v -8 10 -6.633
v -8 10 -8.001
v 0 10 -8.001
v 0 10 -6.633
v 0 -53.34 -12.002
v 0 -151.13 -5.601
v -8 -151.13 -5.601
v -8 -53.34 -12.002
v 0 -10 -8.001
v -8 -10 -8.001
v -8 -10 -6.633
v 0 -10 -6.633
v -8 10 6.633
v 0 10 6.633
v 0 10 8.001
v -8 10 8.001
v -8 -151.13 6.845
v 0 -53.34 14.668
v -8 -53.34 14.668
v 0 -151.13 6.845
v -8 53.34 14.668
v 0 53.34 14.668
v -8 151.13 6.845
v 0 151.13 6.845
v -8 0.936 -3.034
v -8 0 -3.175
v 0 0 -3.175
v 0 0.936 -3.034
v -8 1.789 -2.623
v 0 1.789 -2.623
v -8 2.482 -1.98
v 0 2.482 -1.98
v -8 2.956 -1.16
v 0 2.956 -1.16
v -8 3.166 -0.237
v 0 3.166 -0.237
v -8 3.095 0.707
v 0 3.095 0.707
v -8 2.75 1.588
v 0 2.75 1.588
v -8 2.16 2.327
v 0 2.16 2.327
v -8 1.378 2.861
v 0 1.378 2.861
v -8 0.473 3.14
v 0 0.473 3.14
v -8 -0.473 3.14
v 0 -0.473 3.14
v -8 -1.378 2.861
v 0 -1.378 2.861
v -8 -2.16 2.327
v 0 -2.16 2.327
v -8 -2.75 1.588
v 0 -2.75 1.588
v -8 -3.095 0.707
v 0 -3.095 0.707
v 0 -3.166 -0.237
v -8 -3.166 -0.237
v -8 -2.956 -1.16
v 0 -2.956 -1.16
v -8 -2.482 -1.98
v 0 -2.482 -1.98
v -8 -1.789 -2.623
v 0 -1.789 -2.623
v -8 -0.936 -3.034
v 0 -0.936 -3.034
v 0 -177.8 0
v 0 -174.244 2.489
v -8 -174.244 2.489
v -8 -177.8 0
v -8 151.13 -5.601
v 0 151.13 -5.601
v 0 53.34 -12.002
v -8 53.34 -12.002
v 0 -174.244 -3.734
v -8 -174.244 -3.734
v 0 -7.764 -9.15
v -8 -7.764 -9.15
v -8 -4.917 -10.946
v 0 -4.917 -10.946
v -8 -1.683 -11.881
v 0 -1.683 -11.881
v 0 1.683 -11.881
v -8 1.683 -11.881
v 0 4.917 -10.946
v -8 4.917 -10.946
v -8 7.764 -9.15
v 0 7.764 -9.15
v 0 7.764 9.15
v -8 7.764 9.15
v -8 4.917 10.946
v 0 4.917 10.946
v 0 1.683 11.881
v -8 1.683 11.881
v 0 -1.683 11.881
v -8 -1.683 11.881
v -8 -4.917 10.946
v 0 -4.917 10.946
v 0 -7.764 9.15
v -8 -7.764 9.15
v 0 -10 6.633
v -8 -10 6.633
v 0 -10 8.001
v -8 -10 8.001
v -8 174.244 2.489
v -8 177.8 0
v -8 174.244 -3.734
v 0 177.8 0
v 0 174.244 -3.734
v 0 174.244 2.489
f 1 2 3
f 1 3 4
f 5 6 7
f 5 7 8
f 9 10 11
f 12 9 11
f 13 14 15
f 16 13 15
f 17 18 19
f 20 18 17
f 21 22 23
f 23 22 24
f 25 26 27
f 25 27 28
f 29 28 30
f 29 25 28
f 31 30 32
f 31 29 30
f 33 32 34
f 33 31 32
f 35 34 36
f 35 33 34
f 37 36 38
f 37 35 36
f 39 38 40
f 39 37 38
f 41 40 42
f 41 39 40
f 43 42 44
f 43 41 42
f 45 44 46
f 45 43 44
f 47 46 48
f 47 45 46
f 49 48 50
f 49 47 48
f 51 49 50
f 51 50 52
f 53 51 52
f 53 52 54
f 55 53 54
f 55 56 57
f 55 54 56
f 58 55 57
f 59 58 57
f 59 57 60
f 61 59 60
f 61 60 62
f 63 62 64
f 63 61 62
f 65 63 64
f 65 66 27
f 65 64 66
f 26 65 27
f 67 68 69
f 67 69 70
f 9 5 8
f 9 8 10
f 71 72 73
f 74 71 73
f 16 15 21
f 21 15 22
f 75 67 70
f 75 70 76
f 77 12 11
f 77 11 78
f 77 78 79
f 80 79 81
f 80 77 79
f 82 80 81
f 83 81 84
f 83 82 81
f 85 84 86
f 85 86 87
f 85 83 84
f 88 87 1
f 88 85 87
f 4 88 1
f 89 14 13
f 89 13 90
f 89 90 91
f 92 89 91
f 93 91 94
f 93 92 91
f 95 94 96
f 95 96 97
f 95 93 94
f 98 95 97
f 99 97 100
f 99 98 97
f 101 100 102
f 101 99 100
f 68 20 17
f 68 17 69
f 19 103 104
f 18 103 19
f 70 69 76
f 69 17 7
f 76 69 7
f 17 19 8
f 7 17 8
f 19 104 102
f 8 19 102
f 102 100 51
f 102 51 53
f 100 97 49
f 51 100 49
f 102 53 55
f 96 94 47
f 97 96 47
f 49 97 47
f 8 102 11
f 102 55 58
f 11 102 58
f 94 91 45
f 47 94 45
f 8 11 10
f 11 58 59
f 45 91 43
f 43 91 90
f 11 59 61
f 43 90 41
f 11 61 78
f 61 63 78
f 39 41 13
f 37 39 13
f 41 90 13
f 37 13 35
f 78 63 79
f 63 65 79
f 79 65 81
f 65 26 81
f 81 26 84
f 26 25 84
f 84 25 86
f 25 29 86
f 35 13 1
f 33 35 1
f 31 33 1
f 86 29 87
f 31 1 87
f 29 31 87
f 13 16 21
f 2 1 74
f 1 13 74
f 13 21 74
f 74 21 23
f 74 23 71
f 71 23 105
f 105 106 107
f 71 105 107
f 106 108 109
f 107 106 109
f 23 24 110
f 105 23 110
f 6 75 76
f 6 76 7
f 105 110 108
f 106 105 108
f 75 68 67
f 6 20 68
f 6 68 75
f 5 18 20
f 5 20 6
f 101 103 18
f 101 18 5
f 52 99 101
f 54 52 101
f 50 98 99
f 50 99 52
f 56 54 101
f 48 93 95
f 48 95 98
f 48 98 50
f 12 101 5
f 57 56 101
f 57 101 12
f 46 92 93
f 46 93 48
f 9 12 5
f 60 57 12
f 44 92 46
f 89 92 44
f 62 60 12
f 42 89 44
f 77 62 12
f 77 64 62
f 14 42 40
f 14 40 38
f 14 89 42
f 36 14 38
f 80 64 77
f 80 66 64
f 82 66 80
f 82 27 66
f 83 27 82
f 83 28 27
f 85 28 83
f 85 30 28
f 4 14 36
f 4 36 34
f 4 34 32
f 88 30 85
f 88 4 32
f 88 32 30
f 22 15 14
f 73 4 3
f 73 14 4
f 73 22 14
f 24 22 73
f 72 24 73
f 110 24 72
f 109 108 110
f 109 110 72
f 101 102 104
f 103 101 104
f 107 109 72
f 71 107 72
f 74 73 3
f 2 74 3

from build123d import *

# Parameters (mm, degrees)
BOSS_EXTRUDE1_DEPTH     = 8
BOSS_EXTRUDE1_2_DEPTH   = 8
SKETCH2_R               = 12
BOSS_EXTRUDE2_DEPTH     = 8
CUT_EXTRUDE1_DEPTH      = 179.583327588
CUT_EXTRUDE1_DEPTH_BACK = 179.583327588
SKETCH3_R               = 3.175


with BuildPart() as part:
    # Sketch1 → Boss-Extrude1 (new body)
    with BuildSketch(Plane(origin=(0, 0, 0), x_dir=(0, 0, -1), z_dir=(1, 0, 0))):
        Polygon((-8.001, 10), (-14.6685, 53.34), (-6.8453, 151.13), (-2.4892, 174.244), (0, 177.8), (3.7338, 174.244), (5.6007, 151.13), (12.0015, 53.34), (8.001, 10), align=None)
    extrude(amount=-BOSS_EXTRUDE1_DEPTH)



with BuildPart() as body_2:
    # Sketch1 → Boss-Extrude1 2 (new body)
    with BuildSketch(Plane(origin=(0, 0, 0), x_dir=(0, 0, -1), z_dir=(1, 0, 0))):
        Polygon((-8.001, -10), (-14.6685, -53.34), (-6.8453, -151.13), (-2.4892, -174.244), (0, -177.8), (3.7338, -174.244), (5.6007, -151.13), (12.0015, -53.34), (8.001, -10), align=None)
    extrude(amount=-BOSS_EXTRUDE1_2_DEPTH)


with BuildPart() as part_1:
    add(part.part)

    add(body_2.part)  # Boss-Extrude2 merges body 2
    # Sketch2 → Boss-Extrude2 (add)
    with BuildSketch(Plane(origin=(0, 0, 0), x_dir=(0, 0, -1), z_dir=(1, 0, 0))):
        Circle(SKETCH2_R)
    extrude(amount=-BOSS_EXTRUDE2_DEPTH)

    # Sketch3 → Cut-Extrude1 (cut, two sides: drawn at the far end of the back side and taken through both)
    with BuildSketch(Plane(origin=(0, 0, 0), x_dir=(0, 0, -1), z_dir=(1, 0, 0)).offset(-CUT_EXTRUDE1_DEPTH_BACK)):
        Circle(SKETCH3_R)
    extrude(amount=CUT_EXTRUDE1_DEPTH + CUT_EXTRUDE1_DEPTH_BACK, mode=Mode.SUBTRACT)


solid = part_1.part
